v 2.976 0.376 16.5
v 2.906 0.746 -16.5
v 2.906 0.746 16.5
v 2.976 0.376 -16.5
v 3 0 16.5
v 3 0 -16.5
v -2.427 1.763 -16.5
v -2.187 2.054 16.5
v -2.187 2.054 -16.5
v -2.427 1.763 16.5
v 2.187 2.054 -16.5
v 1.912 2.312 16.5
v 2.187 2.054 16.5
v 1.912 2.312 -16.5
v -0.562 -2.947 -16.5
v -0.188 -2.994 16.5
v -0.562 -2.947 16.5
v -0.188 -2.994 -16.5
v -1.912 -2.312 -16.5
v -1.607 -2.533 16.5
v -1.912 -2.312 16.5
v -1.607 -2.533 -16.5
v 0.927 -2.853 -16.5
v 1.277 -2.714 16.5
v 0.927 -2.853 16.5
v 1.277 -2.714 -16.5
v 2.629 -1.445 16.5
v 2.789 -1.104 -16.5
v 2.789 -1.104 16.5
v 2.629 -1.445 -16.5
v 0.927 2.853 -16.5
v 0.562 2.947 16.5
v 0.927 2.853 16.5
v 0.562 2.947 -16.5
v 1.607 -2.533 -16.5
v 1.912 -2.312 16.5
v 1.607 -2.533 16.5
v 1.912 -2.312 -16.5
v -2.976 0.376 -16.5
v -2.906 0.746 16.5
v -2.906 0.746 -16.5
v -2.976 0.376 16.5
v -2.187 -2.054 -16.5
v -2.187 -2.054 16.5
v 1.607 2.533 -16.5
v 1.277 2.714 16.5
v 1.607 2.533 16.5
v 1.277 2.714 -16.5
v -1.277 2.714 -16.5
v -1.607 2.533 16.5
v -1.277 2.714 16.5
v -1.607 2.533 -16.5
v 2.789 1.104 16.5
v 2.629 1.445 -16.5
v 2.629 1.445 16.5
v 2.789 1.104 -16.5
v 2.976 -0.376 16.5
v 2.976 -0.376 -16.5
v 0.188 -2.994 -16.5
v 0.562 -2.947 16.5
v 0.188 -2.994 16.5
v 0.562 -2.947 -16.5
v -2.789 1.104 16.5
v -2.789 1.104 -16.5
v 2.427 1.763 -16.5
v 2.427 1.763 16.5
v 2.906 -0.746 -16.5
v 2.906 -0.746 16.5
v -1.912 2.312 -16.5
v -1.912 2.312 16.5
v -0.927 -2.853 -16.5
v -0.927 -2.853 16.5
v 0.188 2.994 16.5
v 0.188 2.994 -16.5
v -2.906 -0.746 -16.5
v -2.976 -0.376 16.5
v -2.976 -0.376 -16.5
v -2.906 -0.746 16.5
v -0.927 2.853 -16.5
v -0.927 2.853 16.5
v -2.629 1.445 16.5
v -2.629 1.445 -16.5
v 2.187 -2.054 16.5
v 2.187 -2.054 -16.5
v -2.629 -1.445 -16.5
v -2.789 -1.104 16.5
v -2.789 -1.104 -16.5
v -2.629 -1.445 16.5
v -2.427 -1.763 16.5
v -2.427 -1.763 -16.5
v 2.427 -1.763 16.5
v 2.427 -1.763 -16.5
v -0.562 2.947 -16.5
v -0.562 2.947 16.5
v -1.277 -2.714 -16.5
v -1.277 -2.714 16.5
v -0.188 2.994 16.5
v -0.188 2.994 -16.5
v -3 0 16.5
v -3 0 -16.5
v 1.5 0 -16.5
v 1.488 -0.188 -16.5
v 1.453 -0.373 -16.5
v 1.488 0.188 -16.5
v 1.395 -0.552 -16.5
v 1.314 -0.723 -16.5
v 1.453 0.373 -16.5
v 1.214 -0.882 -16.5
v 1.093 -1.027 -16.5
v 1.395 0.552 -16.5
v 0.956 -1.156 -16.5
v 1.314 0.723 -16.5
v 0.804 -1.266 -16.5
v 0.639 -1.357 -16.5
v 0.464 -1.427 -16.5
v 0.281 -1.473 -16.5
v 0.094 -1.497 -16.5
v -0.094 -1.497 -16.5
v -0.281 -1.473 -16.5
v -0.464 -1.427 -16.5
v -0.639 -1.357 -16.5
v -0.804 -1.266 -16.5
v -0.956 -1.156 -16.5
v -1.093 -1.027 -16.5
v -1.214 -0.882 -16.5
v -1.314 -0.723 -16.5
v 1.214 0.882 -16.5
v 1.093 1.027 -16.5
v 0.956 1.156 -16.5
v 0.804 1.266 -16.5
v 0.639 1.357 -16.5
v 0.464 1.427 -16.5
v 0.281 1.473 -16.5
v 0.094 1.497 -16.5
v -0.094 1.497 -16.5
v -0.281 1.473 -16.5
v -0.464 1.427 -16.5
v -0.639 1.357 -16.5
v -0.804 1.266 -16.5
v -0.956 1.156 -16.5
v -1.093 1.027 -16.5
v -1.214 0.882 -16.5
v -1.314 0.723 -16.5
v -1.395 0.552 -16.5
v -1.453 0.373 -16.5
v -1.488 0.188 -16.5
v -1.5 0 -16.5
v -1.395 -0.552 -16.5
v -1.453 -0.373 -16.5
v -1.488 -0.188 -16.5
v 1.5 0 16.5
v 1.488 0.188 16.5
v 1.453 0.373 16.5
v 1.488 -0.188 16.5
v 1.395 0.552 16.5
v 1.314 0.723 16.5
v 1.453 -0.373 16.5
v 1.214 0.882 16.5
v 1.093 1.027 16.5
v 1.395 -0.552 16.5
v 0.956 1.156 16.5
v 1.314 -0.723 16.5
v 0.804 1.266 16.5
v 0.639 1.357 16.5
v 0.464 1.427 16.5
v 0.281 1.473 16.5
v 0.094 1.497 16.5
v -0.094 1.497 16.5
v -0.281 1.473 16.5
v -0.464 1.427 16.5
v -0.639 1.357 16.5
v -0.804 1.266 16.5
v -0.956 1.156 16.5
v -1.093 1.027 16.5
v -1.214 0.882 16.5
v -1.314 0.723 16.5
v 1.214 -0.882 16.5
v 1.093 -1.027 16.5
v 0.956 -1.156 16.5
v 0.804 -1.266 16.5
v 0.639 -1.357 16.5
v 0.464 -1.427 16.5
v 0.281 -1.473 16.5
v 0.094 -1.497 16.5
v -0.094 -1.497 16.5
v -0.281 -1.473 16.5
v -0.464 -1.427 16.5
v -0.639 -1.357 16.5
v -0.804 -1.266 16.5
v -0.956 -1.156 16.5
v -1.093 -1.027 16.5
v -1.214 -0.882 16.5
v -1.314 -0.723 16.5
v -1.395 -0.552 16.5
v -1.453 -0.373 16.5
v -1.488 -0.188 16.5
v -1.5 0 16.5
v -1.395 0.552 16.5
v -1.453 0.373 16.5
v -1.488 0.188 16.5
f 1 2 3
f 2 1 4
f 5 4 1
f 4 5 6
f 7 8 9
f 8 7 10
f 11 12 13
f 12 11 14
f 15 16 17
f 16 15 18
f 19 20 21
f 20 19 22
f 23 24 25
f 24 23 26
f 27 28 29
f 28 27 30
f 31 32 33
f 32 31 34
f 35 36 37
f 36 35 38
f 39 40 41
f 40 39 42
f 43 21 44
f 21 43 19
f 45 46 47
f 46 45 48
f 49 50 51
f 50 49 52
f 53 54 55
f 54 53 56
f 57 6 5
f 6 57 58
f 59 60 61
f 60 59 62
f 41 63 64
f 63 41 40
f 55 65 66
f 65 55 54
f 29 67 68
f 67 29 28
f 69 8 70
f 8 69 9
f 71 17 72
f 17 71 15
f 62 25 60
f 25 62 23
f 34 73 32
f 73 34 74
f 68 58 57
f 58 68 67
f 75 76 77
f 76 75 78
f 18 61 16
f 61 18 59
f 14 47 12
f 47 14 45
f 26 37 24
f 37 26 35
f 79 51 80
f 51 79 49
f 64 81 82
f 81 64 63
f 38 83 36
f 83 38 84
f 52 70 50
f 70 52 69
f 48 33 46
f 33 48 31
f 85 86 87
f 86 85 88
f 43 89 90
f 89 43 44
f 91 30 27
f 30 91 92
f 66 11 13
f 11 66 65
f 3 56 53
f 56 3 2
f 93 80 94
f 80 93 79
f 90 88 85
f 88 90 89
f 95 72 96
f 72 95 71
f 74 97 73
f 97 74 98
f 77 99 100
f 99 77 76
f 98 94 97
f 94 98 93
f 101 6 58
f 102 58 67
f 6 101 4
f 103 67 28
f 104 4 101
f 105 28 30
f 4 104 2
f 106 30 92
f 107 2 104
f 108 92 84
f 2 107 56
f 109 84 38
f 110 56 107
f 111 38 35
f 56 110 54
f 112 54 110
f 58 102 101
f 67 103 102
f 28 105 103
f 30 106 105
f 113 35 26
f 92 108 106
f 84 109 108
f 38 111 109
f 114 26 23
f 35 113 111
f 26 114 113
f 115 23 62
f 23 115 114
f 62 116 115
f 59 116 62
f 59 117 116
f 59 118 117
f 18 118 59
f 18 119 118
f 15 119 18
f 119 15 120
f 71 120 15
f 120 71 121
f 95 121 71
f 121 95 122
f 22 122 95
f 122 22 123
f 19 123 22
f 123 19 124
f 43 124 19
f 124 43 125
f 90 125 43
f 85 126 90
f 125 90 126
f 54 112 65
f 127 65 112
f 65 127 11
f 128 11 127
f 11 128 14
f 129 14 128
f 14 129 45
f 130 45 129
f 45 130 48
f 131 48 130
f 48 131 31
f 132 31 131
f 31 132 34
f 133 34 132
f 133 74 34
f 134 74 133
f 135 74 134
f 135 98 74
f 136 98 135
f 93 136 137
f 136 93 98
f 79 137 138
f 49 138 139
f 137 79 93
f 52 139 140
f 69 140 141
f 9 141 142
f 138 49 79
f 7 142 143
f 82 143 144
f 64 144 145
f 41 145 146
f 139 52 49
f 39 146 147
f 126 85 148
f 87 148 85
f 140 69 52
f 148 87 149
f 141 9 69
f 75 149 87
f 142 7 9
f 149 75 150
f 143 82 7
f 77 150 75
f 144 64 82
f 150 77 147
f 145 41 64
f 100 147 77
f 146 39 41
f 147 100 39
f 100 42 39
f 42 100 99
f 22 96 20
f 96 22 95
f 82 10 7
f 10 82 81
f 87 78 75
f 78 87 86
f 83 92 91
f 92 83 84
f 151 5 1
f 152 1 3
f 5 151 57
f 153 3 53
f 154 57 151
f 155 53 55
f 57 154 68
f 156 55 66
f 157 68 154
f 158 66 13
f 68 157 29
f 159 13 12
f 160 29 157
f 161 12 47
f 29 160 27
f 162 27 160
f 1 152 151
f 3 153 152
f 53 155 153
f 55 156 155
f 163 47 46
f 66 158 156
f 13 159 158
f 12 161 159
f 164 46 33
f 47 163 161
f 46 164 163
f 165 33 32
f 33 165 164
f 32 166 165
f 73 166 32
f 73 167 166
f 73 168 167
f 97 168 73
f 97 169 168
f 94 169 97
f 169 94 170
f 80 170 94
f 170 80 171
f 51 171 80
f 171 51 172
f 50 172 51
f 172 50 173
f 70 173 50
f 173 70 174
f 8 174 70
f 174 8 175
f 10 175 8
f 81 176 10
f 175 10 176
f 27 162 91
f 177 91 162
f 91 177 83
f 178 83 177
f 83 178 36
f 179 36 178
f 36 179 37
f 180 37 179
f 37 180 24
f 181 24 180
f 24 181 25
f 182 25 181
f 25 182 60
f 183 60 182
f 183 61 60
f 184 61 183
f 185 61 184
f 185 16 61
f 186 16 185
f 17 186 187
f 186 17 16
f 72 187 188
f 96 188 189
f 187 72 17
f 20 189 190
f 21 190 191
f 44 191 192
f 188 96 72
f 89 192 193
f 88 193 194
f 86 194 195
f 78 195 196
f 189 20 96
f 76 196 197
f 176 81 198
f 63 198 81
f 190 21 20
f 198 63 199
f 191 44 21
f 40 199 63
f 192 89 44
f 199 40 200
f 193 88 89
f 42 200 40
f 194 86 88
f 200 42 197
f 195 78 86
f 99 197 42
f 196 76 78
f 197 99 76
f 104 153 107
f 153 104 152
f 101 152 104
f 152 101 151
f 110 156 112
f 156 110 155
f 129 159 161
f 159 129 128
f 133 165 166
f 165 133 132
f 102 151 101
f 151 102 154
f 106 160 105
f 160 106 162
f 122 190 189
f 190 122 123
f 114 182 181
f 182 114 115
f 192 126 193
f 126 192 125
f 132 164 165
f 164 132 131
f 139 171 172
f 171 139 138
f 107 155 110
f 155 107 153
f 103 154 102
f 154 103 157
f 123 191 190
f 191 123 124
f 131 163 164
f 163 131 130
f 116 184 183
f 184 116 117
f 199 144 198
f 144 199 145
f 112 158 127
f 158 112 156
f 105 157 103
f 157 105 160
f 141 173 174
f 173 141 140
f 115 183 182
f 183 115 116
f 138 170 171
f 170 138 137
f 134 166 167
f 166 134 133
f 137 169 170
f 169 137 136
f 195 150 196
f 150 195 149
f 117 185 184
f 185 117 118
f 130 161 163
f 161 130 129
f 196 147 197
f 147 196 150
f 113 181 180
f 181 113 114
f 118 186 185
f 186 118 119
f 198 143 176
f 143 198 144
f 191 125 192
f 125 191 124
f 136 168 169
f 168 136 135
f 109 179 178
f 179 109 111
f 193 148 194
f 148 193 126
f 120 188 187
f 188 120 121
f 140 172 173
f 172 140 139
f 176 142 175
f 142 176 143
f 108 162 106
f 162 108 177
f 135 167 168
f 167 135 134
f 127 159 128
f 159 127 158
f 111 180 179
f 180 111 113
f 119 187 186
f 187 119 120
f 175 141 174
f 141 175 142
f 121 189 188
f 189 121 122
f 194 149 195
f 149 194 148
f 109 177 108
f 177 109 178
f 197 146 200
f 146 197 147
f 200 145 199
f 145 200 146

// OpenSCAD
$fn = 50;


difference() {
	union() {
		translate(v = [0, 0, -16.5000000000]) {
			cylinder(h = 33, r = 3.0000000000);
		}
	}
	union() {
		translate(v = [0, 0, -100.0000000000]) {
			cylinder(h = 200, r = 1.5000000000);
		}
	}
}
